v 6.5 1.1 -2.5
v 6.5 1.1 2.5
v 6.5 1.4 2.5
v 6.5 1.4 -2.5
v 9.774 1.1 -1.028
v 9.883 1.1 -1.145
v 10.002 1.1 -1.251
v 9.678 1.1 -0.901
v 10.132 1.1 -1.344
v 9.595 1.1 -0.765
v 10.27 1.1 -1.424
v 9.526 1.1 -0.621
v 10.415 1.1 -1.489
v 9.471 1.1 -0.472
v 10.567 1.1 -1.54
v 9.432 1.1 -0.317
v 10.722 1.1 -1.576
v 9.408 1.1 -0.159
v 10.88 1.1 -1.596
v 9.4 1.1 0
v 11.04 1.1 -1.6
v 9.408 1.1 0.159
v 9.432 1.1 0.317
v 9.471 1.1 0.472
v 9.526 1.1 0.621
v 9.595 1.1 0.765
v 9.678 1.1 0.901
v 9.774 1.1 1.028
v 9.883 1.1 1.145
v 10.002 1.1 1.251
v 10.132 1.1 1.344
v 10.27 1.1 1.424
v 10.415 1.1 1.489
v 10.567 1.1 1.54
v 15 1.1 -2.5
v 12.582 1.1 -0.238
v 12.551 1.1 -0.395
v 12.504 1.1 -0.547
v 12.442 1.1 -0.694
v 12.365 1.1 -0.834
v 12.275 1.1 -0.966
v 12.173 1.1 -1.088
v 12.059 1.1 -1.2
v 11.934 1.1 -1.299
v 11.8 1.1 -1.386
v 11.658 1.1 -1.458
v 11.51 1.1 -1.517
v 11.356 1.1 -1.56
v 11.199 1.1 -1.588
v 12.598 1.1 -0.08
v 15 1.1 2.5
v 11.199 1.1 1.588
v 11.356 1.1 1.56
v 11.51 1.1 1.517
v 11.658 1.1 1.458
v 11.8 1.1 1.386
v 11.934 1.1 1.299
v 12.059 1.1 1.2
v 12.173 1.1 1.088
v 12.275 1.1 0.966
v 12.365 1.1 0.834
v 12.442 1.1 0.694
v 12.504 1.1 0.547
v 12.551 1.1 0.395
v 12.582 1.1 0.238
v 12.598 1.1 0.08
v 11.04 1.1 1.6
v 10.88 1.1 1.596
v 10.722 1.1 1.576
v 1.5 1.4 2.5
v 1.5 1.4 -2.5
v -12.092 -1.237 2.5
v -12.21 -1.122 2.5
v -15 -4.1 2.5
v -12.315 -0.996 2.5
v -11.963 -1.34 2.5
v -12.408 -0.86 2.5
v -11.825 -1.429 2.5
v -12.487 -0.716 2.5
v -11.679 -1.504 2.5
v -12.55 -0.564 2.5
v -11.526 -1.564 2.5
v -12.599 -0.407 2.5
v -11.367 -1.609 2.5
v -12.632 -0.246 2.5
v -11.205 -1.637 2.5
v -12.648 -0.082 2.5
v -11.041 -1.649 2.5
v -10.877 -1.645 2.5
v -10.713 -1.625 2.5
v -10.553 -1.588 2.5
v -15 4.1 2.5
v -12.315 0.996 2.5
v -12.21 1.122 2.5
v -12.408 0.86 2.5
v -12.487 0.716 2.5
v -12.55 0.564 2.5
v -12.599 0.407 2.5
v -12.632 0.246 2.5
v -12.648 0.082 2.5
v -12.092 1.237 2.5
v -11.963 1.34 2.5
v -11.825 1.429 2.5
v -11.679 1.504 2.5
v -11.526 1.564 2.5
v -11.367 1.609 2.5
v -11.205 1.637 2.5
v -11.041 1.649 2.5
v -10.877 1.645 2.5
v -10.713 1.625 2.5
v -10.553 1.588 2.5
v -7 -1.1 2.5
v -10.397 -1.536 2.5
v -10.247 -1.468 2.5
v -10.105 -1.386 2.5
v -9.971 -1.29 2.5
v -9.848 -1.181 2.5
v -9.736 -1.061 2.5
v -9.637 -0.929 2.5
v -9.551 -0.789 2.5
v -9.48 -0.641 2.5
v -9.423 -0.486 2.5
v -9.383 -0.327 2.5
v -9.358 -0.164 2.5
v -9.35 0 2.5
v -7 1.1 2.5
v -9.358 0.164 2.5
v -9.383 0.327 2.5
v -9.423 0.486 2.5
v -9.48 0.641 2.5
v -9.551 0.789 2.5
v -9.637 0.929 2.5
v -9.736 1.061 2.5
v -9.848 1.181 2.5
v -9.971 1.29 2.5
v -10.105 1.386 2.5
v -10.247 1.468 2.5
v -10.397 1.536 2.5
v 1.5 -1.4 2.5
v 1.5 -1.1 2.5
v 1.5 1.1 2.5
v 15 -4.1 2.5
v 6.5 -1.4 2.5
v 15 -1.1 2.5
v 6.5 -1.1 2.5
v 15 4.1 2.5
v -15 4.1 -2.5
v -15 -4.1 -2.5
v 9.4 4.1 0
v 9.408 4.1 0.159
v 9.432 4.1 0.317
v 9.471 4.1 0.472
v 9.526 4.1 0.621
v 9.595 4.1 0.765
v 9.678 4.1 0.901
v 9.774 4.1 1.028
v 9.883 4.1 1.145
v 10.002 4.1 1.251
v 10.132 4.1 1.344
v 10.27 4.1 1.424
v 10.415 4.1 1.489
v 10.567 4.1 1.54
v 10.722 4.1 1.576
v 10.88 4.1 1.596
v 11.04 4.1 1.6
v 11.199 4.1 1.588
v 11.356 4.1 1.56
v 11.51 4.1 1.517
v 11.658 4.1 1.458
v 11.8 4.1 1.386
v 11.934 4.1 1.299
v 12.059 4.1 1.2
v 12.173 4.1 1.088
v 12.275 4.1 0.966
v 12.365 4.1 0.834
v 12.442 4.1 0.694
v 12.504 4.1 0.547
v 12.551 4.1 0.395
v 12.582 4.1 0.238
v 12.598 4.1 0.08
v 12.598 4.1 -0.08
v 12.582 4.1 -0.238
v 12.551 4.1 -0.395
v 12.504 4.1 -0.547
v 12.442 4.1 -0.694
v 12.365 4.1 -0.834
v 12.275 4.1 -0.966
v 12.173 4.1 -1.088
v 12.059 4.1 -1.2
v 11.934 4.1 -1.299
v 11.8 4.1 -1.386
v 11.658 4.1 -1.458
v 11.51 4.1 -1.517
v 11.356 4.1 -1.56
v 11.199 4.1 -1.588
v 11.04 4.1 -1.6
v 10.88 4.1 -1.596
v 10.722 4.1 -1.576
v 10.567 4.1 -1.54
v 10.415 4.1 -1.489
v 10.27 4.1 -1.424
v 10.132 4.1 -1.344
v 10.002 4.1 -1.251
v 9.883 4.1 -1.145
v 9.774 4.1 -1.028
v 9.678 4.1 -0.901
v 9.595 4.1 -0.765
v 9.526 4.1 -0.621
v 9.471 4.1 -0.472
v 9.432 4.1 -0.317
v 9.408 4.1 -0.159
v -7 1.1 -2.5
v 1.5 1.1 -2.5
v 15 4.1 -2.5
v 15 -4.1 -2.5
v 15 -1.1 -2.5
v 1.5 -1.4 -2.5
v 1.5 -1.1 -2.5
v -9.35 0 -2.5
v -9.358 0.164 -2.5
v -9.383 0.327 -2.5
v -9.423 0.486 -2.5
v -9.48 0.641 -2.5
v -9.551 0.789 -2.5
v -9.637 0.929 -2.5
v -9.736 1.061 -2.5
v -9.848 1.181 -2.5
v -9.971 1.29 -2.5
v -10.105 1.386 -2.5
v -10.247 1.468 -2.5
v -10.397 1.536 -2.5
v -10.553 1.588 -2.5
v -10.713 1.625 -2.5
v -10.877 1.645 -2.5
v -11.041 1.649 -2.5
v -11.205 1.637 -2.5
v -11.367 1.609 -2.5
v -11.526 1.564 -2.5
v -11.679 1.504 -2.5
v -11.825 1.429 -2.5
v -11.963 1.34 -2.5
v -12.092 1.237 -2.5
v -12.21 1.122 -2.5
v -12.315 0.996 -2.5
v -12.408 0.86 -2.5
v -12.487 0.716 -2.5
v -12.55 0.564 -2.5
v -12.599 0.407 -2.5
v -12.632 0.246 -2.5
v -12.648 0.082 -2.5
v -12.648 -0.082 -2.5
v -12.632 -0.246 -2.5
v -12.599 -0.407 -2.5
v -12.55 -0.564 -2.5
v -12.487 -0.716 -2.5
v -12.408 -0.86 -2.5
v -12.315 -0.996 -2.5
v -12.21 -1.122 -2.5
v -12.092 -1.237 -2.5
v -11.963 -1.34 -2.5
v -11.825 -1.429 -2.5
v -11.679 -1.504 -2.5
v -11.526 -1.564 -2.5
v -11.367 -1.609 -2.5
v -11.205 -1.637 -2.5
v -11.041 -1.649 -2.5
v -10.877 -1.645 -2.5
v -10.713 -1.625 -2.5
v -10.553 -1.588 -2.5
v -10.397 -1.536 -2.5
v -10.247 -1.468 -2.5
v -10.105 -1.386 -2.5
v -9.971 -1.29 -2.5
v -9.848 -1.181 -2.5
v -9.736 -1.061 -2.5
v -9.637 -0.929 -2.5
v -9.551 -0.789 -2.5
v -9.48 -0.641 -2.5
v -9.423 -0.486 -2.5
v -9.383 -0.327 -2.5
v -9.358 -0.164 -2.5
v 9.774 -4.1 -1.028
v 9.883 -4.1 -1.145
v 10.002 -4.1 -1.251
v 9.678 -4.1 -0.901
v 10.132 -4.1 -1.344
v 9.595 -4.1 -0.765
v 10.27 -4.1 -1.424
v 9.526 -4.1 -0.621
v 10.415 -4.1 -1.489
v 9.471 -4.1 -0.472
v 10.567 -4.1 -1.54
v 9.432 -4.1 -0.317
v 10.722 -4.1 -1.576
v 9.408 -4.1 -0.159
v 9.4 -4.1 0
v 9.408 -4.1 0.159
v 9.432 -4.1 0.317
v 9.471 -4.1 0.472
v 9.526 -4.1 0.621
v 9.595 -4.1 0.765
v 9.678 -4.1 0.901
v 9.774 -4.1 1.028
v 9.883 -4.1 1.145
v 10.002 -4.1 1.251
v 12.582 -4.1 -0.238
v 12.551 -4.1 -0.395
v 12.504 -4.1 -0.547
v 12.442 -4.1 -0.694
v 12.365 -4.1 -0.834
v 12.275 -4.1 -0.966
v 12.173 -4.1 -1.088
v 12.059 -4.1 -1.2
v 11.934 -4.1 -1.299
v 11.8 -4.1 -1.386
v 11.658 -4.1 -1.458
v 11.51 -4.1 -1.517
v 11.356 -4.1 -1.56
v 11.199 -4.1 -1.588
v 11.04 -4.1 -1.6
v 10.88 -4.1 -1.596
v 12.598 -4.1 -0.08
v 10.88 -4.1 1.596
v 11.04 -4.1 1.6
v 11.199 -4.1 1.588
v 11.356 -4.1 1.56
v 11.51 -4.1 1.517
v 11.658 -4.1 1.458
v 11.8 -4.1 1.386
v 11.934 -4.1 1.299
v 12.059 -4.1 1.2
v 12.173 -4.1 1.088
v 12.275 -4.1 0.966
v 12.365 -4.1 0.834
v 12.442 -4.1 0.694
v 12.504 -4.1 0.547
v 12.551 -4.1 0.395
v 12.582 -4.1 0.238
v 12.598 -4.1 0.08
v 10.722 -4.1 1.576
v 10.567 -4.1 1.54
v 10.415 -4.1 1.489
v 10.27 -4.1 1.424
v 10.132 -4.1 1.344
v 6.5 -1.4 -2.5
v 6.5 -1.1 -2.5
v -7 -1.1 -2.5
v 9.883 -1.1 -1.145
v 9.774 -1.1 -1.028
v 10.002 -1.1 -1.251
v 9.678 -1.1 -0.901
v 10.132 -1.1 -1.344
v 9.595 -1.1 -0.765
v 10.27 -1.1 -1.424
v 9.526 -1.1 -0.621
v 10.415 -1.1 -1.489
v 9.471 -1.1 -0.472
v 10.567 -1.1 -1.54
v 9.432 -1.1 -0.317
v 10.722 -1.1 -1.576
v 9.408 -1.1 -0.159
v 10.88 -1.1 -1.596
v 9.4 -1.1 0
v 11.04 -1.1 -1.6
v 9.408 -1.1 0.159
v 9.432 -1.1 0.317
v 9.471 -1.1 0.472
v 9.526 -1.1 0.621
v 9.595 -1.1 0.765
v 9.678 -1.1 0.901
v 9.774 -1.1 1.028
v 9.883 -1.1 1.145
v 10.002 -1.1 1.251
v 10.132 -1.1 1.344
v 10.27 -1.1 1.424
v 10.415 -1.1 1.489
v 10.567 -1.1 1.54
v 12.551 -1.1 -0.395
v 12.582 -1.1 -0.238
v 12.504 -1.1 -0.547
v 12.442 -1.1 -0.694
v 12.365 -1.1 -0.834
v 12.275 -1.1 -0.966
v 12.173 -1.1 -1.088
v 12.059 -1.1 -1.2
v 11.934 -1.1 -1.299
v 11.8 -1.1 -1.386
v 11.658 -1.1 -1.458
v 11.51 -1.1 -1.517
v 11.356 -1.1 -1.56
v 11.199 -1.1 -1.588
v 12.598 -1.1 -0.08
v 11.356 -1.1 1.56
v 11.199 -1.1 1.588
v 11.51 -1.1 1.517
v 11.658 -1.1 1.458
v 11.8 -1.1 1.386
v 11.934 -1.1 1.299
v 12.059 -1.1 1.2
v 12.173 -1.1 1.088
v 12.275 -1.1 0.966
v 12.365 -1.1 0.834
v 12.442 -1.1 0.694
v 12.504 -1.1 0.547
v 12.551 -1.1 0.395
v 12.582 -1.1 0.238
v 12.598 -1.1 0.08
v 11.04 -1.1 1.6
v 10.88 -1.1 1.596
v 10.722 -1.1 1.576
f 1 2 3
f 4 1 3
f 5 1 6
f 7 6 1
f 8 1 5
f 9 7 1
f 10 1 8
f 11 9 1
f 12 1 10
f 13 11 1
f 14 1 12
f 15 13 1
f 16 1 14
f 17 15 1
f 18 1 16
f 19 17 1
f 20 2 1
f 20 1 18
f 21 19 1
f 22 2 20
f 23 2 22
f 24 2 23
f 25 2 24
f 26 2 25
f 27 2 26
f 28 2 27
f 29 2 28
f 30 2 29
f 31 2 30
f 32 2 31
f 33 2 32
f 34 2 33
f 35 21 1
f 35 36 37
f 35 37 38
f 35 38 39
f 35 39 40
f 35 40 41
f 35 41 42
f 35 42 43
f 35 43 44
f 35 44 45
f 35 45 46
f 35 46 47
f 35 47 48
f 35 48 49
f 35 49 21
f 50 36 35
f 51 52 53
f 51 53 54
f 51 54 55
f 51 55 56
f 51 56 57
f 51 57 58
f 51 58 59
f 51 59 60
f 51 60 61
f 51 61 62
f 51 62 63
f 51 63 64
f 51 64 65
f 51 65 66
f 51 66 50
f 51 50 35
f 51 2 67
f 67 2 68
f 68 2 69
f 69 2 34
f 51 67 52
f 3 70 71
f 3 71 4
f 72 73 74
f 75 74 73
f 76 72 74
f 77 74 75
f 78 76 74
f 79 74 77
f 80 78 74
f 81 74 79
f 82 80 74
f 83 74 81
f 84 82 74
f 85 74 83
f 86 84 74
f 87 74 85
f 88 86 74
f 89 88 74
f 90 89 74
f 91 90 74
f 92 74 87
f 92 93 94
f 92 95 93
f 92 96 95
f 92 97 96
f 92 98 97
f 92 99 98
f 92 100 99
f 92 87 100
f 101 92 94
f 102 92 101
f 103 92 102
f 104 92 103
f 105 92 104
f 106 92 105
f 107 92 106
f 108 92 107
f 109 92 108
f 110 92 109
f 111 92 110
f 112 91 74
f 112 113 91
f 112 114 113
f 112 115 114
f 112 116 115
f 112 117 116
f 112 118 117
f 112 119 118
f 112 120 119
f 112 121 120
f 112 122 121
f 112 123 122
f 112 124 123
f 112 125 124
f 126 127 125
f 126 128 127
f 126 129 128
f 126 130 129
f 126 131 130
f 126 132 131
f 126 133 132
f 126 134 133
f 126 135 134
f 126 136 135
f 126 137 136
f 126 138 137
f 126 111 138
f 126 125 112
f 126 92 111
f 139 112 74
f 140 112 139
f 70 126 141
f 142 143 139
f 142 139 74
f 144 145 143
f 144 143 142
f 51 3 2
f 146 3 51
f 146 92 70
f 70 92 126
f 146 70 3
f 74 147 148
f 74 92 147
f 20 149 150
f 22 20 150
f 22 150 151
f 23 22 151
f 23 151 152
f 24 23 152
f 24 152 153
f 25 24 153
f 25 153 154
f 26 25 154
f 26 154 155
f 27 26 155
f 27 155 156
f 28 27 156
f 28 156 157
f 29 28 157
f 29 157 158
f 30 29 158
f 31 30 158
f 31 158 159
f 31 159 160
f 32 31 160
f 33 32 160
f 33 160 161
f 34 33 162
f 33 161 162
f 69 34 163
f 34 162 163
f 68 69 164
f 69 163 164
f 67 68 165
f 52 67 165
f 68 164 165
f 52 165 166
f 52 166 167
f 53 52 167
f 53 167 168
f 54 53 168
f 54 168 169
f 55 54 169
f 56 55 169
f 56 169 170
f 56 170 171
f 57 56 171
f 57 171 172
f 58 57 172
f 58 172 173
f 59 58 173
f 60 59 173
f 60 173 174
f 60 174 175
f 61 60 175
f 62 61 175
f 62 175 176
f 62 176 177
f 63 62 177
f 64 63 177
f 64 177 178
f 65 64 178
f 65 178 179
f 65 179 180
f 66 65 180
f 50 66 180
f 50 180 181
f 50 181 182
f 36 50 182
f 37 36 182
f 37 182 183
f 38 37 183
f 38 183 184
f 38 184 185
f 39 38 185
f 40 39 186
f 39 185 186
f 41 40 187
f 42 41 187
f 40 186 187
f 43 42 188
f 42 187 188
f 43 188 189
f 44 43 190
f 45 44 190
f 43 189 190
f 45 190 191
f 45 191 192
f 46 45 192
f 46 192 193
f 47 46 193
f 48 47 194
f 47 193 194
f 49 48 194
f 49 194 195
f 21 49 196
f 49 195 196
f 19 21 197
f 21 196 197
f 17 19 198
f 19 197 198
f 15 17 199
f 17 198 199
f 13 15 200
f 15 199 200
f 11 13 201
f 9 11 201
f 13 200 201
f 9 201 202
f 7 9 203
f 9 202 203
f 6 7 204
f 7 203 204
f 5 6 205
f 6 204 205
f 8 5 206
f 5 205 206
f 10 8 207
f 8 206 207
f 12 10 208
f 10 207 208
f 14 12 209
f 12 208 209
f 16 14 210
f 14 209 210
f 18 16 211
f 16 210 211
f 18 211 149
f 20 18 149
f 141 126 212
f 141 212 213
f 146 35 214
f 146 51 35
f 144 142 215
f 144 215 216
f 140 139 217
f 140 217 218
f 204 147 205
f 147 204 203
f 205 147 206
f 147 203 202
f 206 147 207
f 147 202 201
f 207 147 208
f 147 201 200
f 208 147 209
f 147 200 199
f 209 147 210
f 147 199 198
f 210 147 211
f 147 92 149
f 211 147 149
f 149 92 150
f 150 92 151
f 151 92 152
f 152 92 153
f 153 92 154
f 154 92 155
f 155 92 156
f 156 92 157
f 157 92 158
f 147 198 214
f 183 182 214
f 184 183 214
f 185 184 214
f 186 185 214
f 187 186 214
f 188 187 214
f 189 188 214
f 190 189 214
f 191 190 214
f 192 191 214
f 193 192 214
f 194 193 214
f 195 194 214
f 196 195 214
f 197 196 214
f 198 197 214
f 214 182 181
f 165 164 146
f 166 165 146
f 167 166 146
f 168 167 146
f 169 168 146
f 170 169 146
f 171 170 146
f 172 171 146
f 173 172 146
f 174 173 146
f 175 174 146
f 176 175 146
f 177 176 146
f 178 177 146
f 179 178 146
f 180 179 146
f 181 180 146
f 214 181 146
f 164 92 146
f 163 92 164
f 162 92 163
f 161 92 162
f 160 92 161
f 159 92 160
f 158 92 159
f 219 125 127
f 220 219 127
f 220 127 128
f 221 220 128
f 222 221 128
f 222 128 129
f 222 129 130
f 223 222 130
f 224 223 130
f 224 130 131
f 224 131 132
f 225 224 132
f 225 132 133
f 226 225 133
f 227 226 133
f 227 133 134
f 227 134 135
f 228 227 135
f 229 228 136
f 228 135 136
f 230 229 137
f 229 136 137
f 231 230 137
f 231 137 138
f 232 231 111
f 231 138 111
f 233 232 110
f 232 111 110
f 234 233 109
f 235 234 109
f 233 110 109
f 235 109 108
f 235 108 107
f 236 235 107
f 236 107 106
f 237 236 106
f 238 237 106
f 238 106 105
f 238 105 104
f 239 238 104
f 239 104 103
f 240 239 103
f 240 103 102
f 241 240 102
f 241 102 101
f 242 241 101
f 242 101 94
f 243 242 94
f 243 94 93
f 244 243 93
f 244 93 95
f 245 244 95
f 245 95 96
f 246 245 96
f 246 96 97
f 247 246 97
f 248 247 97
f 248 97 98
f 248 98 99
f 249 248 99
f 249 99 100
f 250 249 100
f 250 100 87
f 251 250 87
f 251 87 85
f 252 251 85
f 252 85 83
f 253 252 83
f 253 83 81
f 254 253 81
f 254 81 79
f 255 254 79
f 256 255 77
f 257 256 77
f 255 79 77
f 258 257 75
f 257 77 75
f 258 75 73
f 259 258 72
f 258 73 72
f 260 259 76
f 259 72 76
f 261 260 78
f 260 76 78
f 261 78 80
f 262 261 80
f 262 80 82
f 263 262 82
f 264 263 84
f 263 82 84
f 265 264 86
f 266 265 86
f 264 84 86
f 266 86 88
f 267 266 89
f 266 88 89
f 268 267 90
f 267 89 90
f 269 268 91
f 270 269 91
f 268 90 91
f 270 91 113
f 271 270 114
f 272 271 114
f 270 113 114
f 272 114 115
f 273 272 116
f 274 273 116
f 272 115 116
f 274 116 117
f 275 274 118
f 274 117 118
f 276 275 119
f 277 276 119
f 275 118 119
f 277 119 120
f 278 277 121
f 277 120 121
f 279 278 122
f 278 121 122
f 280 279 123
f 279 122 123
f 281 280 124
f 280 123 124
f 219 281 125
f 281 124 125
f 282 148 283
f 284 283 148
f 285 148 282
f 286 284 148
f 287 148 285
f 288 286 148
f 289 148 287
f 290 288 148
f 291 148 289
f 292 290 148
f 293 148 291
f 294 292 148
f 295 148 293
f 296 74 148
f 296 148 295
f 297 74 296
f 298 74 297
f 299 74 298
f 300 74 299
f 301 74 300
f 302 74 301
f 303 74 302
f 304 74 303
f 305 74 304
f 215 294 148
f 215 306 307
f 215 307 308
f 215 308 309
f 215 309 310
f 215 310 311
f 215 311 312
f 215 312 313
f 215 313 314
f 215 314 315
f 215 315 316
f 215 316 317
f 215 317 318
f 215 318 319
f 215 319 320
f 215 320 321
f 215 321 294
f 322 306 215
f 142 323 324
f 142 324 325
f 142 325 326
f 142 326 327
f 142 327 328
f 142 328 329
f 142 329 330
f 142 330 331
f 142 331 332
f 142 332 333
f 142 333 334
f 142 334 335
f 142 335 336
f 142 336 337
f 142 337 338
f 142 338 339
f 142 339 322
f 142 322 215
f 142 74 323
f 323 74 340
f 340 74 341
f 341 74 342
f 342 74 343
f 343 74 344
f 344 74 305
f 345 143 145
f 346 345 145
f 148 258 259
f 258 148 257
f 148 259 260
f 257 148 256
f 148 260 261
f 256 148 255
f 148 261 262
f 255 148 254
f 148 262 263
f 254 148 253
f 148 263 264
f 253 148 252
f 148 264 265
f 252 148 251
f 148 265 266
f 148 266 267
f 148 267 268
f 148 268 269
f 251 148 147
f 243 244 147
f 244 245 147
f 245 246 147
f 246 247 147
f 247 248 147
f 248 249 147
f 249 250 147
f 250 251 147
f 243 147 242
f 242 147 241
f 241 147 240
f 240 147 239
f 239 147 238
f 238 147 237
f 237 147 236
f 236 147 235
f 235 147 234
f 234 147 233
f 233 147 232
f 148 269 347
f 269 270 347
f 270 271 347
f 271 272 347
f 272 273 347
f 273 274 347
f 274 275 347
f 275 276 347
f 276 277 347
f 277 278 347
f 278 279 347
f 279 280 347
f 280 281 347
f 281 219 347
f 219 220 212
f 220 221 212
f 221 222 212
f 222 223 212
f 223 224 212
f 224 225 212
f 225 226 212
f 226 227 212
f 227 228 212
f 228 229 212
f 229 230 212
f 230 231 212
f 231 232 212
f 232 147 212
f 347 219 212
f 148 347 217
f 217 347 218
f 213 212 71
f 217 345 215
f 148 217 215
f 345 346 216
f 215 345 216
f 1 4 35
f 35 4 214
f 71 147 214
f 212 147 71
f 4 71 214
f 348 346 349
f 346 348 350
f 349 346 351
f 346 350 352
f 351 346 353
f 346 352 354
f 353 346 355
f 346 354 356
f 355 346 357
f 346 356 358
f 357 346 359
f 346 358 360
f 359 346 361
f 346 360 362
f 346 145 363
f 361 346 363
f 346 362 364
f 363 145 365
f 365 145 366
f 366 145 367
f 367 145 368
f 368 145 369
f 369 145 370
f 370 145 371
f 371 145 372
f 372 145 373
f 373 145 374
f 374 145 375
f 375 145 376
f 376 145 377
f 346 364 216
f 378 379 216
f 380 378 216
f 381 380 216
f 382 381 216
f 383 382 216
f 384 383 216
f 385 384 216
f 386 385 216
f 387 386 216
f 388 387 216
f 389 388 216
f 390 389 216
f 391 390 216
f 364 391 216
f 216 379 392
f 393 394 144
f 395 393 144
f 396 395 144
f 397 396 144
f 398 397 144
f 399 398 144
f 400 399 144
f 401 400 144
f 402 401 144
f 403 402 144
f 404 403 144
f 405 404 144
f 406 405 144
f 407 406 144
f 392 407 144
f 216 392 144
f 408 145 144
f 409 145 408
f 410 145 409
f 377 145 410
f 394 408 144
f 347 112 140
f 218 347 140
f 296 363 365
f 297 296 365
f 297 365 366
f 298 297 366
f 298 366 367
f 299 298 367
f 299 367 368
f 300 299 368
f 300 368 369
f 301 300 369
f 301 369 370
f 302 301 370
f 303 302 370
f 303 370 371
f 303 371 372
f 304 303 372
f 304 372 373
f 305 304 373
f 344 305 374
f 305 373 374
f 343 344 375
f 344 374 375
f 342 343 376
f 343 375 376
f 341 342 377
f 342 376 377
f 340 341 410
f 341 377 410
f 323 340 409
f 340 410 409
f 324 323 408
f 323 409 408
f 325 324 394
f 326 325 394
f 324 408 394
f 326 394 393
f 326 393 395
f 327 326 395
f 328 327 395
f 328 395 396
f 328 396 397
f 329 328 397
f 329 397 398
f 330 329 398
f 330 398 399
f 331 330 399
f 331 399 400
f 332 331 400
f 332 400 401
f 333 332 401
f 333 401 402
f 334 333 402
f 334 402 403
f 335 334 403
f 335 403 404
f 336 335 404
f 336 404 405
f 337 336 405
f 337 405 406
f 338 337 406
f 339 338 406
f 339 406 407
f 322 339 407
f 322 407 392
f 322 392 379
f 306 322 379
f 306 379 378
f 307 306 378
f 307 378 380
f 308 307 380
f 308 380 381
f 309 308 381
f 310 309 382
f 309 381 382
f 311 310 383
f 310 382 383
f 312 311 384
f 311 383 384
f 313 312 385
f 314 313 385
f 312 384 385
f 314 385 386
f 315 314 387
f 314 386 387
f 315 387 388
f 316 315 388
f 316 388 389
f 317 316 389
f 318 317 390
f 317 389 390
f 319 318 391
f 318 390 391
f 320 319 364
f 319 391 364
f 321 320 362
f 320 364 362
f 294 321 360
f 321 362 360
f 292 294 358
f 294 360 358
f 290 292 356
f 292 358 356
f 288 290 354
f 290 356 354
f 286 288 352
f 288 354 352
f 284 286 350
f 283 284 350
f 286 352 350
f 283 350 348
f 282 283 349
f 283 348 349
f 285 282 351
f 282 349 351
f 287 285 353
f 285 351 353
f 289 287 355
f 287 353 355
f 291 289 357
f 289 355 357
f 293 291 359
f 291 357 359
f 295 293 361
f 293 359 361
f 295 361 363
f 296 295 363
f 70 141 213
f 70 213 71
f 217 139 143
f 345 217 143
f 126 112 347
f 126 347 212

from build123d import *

# Parameters (mm, degrees)
SKETCH_1_W          = 30
SKETCH_1_H          = 3
SKETCH_1_W_2        = 8
SKETCH_1_H_2        = 2.2
EXTRUDE_2_DEPTH     = 2.5
SKETCH_2_R          = 1.65
CUT_EXTRUDE_1_DEPTH = 14
SKETCH_3_W          = 5
SKETCH_3_H          = 2.8
CUT_EXTRUDE_2_DEPTH = 14
SKETCH_5_R          = 1.6
CUT_EXTRUDE_3_DEPTH = 50


with BuildPart() as part:
    # 草图1 → 凸台-拉伸2 (new, symmetric)
    with BuildSketch(Plane.XY):
        with Locations((0, 2.6)):
            Rectangle(SKETCH_1_W, SKETCH_1_H)
        with Locations((-11, 0)):
            Rectangle(SKETCH_1_W_2, SKETCH_1_H_2)
        with Locations((0, -2.6)):
            Rectangle(SKETCH_1_W, SKETCH_1_H)
    extrude(amount=EXTRUDE_2_DEPTH, both=True)

    # 草图2 → 切除-拉伸1 (cut)
    with BuildSketch(Plane.XY.offset(2.5)):
        with Locations((-11, 0)):
            Circle(SKETCH_2_R)
    extrude(amount=-CUT_EXTRUDE_1_DEPTH, mode=Mode.SUBTRACT)

    # 草图3 → 切除-拉伸2 (cut)
    with BuildSketch(Plane.XY.offset(2.5)):
        with Locations((4, 0)):
            Rectangle(SKETCH_3_W, SKETCH_3_H)
    extrude(amount=-CUT_EXTRUDE_2_DEPTH, mode=Mode.SUBTRACT)

    # 草图5 → 切除-拉伸3 (cut)
    with BuildSketch(Plane(origin=(0, 4.1, 0), x_dir=(1, 0, 0), z_dir=(0, 1, 0))):
        with Locations(Location((11, 0, 0), (0, 0, 180))):
            Circle(SKETCH_5_R)
    extrude(amount=-CUT_EXTRUDE_3_DEPTH, mode=Mode.SUBTRACT)


solid = part.part
